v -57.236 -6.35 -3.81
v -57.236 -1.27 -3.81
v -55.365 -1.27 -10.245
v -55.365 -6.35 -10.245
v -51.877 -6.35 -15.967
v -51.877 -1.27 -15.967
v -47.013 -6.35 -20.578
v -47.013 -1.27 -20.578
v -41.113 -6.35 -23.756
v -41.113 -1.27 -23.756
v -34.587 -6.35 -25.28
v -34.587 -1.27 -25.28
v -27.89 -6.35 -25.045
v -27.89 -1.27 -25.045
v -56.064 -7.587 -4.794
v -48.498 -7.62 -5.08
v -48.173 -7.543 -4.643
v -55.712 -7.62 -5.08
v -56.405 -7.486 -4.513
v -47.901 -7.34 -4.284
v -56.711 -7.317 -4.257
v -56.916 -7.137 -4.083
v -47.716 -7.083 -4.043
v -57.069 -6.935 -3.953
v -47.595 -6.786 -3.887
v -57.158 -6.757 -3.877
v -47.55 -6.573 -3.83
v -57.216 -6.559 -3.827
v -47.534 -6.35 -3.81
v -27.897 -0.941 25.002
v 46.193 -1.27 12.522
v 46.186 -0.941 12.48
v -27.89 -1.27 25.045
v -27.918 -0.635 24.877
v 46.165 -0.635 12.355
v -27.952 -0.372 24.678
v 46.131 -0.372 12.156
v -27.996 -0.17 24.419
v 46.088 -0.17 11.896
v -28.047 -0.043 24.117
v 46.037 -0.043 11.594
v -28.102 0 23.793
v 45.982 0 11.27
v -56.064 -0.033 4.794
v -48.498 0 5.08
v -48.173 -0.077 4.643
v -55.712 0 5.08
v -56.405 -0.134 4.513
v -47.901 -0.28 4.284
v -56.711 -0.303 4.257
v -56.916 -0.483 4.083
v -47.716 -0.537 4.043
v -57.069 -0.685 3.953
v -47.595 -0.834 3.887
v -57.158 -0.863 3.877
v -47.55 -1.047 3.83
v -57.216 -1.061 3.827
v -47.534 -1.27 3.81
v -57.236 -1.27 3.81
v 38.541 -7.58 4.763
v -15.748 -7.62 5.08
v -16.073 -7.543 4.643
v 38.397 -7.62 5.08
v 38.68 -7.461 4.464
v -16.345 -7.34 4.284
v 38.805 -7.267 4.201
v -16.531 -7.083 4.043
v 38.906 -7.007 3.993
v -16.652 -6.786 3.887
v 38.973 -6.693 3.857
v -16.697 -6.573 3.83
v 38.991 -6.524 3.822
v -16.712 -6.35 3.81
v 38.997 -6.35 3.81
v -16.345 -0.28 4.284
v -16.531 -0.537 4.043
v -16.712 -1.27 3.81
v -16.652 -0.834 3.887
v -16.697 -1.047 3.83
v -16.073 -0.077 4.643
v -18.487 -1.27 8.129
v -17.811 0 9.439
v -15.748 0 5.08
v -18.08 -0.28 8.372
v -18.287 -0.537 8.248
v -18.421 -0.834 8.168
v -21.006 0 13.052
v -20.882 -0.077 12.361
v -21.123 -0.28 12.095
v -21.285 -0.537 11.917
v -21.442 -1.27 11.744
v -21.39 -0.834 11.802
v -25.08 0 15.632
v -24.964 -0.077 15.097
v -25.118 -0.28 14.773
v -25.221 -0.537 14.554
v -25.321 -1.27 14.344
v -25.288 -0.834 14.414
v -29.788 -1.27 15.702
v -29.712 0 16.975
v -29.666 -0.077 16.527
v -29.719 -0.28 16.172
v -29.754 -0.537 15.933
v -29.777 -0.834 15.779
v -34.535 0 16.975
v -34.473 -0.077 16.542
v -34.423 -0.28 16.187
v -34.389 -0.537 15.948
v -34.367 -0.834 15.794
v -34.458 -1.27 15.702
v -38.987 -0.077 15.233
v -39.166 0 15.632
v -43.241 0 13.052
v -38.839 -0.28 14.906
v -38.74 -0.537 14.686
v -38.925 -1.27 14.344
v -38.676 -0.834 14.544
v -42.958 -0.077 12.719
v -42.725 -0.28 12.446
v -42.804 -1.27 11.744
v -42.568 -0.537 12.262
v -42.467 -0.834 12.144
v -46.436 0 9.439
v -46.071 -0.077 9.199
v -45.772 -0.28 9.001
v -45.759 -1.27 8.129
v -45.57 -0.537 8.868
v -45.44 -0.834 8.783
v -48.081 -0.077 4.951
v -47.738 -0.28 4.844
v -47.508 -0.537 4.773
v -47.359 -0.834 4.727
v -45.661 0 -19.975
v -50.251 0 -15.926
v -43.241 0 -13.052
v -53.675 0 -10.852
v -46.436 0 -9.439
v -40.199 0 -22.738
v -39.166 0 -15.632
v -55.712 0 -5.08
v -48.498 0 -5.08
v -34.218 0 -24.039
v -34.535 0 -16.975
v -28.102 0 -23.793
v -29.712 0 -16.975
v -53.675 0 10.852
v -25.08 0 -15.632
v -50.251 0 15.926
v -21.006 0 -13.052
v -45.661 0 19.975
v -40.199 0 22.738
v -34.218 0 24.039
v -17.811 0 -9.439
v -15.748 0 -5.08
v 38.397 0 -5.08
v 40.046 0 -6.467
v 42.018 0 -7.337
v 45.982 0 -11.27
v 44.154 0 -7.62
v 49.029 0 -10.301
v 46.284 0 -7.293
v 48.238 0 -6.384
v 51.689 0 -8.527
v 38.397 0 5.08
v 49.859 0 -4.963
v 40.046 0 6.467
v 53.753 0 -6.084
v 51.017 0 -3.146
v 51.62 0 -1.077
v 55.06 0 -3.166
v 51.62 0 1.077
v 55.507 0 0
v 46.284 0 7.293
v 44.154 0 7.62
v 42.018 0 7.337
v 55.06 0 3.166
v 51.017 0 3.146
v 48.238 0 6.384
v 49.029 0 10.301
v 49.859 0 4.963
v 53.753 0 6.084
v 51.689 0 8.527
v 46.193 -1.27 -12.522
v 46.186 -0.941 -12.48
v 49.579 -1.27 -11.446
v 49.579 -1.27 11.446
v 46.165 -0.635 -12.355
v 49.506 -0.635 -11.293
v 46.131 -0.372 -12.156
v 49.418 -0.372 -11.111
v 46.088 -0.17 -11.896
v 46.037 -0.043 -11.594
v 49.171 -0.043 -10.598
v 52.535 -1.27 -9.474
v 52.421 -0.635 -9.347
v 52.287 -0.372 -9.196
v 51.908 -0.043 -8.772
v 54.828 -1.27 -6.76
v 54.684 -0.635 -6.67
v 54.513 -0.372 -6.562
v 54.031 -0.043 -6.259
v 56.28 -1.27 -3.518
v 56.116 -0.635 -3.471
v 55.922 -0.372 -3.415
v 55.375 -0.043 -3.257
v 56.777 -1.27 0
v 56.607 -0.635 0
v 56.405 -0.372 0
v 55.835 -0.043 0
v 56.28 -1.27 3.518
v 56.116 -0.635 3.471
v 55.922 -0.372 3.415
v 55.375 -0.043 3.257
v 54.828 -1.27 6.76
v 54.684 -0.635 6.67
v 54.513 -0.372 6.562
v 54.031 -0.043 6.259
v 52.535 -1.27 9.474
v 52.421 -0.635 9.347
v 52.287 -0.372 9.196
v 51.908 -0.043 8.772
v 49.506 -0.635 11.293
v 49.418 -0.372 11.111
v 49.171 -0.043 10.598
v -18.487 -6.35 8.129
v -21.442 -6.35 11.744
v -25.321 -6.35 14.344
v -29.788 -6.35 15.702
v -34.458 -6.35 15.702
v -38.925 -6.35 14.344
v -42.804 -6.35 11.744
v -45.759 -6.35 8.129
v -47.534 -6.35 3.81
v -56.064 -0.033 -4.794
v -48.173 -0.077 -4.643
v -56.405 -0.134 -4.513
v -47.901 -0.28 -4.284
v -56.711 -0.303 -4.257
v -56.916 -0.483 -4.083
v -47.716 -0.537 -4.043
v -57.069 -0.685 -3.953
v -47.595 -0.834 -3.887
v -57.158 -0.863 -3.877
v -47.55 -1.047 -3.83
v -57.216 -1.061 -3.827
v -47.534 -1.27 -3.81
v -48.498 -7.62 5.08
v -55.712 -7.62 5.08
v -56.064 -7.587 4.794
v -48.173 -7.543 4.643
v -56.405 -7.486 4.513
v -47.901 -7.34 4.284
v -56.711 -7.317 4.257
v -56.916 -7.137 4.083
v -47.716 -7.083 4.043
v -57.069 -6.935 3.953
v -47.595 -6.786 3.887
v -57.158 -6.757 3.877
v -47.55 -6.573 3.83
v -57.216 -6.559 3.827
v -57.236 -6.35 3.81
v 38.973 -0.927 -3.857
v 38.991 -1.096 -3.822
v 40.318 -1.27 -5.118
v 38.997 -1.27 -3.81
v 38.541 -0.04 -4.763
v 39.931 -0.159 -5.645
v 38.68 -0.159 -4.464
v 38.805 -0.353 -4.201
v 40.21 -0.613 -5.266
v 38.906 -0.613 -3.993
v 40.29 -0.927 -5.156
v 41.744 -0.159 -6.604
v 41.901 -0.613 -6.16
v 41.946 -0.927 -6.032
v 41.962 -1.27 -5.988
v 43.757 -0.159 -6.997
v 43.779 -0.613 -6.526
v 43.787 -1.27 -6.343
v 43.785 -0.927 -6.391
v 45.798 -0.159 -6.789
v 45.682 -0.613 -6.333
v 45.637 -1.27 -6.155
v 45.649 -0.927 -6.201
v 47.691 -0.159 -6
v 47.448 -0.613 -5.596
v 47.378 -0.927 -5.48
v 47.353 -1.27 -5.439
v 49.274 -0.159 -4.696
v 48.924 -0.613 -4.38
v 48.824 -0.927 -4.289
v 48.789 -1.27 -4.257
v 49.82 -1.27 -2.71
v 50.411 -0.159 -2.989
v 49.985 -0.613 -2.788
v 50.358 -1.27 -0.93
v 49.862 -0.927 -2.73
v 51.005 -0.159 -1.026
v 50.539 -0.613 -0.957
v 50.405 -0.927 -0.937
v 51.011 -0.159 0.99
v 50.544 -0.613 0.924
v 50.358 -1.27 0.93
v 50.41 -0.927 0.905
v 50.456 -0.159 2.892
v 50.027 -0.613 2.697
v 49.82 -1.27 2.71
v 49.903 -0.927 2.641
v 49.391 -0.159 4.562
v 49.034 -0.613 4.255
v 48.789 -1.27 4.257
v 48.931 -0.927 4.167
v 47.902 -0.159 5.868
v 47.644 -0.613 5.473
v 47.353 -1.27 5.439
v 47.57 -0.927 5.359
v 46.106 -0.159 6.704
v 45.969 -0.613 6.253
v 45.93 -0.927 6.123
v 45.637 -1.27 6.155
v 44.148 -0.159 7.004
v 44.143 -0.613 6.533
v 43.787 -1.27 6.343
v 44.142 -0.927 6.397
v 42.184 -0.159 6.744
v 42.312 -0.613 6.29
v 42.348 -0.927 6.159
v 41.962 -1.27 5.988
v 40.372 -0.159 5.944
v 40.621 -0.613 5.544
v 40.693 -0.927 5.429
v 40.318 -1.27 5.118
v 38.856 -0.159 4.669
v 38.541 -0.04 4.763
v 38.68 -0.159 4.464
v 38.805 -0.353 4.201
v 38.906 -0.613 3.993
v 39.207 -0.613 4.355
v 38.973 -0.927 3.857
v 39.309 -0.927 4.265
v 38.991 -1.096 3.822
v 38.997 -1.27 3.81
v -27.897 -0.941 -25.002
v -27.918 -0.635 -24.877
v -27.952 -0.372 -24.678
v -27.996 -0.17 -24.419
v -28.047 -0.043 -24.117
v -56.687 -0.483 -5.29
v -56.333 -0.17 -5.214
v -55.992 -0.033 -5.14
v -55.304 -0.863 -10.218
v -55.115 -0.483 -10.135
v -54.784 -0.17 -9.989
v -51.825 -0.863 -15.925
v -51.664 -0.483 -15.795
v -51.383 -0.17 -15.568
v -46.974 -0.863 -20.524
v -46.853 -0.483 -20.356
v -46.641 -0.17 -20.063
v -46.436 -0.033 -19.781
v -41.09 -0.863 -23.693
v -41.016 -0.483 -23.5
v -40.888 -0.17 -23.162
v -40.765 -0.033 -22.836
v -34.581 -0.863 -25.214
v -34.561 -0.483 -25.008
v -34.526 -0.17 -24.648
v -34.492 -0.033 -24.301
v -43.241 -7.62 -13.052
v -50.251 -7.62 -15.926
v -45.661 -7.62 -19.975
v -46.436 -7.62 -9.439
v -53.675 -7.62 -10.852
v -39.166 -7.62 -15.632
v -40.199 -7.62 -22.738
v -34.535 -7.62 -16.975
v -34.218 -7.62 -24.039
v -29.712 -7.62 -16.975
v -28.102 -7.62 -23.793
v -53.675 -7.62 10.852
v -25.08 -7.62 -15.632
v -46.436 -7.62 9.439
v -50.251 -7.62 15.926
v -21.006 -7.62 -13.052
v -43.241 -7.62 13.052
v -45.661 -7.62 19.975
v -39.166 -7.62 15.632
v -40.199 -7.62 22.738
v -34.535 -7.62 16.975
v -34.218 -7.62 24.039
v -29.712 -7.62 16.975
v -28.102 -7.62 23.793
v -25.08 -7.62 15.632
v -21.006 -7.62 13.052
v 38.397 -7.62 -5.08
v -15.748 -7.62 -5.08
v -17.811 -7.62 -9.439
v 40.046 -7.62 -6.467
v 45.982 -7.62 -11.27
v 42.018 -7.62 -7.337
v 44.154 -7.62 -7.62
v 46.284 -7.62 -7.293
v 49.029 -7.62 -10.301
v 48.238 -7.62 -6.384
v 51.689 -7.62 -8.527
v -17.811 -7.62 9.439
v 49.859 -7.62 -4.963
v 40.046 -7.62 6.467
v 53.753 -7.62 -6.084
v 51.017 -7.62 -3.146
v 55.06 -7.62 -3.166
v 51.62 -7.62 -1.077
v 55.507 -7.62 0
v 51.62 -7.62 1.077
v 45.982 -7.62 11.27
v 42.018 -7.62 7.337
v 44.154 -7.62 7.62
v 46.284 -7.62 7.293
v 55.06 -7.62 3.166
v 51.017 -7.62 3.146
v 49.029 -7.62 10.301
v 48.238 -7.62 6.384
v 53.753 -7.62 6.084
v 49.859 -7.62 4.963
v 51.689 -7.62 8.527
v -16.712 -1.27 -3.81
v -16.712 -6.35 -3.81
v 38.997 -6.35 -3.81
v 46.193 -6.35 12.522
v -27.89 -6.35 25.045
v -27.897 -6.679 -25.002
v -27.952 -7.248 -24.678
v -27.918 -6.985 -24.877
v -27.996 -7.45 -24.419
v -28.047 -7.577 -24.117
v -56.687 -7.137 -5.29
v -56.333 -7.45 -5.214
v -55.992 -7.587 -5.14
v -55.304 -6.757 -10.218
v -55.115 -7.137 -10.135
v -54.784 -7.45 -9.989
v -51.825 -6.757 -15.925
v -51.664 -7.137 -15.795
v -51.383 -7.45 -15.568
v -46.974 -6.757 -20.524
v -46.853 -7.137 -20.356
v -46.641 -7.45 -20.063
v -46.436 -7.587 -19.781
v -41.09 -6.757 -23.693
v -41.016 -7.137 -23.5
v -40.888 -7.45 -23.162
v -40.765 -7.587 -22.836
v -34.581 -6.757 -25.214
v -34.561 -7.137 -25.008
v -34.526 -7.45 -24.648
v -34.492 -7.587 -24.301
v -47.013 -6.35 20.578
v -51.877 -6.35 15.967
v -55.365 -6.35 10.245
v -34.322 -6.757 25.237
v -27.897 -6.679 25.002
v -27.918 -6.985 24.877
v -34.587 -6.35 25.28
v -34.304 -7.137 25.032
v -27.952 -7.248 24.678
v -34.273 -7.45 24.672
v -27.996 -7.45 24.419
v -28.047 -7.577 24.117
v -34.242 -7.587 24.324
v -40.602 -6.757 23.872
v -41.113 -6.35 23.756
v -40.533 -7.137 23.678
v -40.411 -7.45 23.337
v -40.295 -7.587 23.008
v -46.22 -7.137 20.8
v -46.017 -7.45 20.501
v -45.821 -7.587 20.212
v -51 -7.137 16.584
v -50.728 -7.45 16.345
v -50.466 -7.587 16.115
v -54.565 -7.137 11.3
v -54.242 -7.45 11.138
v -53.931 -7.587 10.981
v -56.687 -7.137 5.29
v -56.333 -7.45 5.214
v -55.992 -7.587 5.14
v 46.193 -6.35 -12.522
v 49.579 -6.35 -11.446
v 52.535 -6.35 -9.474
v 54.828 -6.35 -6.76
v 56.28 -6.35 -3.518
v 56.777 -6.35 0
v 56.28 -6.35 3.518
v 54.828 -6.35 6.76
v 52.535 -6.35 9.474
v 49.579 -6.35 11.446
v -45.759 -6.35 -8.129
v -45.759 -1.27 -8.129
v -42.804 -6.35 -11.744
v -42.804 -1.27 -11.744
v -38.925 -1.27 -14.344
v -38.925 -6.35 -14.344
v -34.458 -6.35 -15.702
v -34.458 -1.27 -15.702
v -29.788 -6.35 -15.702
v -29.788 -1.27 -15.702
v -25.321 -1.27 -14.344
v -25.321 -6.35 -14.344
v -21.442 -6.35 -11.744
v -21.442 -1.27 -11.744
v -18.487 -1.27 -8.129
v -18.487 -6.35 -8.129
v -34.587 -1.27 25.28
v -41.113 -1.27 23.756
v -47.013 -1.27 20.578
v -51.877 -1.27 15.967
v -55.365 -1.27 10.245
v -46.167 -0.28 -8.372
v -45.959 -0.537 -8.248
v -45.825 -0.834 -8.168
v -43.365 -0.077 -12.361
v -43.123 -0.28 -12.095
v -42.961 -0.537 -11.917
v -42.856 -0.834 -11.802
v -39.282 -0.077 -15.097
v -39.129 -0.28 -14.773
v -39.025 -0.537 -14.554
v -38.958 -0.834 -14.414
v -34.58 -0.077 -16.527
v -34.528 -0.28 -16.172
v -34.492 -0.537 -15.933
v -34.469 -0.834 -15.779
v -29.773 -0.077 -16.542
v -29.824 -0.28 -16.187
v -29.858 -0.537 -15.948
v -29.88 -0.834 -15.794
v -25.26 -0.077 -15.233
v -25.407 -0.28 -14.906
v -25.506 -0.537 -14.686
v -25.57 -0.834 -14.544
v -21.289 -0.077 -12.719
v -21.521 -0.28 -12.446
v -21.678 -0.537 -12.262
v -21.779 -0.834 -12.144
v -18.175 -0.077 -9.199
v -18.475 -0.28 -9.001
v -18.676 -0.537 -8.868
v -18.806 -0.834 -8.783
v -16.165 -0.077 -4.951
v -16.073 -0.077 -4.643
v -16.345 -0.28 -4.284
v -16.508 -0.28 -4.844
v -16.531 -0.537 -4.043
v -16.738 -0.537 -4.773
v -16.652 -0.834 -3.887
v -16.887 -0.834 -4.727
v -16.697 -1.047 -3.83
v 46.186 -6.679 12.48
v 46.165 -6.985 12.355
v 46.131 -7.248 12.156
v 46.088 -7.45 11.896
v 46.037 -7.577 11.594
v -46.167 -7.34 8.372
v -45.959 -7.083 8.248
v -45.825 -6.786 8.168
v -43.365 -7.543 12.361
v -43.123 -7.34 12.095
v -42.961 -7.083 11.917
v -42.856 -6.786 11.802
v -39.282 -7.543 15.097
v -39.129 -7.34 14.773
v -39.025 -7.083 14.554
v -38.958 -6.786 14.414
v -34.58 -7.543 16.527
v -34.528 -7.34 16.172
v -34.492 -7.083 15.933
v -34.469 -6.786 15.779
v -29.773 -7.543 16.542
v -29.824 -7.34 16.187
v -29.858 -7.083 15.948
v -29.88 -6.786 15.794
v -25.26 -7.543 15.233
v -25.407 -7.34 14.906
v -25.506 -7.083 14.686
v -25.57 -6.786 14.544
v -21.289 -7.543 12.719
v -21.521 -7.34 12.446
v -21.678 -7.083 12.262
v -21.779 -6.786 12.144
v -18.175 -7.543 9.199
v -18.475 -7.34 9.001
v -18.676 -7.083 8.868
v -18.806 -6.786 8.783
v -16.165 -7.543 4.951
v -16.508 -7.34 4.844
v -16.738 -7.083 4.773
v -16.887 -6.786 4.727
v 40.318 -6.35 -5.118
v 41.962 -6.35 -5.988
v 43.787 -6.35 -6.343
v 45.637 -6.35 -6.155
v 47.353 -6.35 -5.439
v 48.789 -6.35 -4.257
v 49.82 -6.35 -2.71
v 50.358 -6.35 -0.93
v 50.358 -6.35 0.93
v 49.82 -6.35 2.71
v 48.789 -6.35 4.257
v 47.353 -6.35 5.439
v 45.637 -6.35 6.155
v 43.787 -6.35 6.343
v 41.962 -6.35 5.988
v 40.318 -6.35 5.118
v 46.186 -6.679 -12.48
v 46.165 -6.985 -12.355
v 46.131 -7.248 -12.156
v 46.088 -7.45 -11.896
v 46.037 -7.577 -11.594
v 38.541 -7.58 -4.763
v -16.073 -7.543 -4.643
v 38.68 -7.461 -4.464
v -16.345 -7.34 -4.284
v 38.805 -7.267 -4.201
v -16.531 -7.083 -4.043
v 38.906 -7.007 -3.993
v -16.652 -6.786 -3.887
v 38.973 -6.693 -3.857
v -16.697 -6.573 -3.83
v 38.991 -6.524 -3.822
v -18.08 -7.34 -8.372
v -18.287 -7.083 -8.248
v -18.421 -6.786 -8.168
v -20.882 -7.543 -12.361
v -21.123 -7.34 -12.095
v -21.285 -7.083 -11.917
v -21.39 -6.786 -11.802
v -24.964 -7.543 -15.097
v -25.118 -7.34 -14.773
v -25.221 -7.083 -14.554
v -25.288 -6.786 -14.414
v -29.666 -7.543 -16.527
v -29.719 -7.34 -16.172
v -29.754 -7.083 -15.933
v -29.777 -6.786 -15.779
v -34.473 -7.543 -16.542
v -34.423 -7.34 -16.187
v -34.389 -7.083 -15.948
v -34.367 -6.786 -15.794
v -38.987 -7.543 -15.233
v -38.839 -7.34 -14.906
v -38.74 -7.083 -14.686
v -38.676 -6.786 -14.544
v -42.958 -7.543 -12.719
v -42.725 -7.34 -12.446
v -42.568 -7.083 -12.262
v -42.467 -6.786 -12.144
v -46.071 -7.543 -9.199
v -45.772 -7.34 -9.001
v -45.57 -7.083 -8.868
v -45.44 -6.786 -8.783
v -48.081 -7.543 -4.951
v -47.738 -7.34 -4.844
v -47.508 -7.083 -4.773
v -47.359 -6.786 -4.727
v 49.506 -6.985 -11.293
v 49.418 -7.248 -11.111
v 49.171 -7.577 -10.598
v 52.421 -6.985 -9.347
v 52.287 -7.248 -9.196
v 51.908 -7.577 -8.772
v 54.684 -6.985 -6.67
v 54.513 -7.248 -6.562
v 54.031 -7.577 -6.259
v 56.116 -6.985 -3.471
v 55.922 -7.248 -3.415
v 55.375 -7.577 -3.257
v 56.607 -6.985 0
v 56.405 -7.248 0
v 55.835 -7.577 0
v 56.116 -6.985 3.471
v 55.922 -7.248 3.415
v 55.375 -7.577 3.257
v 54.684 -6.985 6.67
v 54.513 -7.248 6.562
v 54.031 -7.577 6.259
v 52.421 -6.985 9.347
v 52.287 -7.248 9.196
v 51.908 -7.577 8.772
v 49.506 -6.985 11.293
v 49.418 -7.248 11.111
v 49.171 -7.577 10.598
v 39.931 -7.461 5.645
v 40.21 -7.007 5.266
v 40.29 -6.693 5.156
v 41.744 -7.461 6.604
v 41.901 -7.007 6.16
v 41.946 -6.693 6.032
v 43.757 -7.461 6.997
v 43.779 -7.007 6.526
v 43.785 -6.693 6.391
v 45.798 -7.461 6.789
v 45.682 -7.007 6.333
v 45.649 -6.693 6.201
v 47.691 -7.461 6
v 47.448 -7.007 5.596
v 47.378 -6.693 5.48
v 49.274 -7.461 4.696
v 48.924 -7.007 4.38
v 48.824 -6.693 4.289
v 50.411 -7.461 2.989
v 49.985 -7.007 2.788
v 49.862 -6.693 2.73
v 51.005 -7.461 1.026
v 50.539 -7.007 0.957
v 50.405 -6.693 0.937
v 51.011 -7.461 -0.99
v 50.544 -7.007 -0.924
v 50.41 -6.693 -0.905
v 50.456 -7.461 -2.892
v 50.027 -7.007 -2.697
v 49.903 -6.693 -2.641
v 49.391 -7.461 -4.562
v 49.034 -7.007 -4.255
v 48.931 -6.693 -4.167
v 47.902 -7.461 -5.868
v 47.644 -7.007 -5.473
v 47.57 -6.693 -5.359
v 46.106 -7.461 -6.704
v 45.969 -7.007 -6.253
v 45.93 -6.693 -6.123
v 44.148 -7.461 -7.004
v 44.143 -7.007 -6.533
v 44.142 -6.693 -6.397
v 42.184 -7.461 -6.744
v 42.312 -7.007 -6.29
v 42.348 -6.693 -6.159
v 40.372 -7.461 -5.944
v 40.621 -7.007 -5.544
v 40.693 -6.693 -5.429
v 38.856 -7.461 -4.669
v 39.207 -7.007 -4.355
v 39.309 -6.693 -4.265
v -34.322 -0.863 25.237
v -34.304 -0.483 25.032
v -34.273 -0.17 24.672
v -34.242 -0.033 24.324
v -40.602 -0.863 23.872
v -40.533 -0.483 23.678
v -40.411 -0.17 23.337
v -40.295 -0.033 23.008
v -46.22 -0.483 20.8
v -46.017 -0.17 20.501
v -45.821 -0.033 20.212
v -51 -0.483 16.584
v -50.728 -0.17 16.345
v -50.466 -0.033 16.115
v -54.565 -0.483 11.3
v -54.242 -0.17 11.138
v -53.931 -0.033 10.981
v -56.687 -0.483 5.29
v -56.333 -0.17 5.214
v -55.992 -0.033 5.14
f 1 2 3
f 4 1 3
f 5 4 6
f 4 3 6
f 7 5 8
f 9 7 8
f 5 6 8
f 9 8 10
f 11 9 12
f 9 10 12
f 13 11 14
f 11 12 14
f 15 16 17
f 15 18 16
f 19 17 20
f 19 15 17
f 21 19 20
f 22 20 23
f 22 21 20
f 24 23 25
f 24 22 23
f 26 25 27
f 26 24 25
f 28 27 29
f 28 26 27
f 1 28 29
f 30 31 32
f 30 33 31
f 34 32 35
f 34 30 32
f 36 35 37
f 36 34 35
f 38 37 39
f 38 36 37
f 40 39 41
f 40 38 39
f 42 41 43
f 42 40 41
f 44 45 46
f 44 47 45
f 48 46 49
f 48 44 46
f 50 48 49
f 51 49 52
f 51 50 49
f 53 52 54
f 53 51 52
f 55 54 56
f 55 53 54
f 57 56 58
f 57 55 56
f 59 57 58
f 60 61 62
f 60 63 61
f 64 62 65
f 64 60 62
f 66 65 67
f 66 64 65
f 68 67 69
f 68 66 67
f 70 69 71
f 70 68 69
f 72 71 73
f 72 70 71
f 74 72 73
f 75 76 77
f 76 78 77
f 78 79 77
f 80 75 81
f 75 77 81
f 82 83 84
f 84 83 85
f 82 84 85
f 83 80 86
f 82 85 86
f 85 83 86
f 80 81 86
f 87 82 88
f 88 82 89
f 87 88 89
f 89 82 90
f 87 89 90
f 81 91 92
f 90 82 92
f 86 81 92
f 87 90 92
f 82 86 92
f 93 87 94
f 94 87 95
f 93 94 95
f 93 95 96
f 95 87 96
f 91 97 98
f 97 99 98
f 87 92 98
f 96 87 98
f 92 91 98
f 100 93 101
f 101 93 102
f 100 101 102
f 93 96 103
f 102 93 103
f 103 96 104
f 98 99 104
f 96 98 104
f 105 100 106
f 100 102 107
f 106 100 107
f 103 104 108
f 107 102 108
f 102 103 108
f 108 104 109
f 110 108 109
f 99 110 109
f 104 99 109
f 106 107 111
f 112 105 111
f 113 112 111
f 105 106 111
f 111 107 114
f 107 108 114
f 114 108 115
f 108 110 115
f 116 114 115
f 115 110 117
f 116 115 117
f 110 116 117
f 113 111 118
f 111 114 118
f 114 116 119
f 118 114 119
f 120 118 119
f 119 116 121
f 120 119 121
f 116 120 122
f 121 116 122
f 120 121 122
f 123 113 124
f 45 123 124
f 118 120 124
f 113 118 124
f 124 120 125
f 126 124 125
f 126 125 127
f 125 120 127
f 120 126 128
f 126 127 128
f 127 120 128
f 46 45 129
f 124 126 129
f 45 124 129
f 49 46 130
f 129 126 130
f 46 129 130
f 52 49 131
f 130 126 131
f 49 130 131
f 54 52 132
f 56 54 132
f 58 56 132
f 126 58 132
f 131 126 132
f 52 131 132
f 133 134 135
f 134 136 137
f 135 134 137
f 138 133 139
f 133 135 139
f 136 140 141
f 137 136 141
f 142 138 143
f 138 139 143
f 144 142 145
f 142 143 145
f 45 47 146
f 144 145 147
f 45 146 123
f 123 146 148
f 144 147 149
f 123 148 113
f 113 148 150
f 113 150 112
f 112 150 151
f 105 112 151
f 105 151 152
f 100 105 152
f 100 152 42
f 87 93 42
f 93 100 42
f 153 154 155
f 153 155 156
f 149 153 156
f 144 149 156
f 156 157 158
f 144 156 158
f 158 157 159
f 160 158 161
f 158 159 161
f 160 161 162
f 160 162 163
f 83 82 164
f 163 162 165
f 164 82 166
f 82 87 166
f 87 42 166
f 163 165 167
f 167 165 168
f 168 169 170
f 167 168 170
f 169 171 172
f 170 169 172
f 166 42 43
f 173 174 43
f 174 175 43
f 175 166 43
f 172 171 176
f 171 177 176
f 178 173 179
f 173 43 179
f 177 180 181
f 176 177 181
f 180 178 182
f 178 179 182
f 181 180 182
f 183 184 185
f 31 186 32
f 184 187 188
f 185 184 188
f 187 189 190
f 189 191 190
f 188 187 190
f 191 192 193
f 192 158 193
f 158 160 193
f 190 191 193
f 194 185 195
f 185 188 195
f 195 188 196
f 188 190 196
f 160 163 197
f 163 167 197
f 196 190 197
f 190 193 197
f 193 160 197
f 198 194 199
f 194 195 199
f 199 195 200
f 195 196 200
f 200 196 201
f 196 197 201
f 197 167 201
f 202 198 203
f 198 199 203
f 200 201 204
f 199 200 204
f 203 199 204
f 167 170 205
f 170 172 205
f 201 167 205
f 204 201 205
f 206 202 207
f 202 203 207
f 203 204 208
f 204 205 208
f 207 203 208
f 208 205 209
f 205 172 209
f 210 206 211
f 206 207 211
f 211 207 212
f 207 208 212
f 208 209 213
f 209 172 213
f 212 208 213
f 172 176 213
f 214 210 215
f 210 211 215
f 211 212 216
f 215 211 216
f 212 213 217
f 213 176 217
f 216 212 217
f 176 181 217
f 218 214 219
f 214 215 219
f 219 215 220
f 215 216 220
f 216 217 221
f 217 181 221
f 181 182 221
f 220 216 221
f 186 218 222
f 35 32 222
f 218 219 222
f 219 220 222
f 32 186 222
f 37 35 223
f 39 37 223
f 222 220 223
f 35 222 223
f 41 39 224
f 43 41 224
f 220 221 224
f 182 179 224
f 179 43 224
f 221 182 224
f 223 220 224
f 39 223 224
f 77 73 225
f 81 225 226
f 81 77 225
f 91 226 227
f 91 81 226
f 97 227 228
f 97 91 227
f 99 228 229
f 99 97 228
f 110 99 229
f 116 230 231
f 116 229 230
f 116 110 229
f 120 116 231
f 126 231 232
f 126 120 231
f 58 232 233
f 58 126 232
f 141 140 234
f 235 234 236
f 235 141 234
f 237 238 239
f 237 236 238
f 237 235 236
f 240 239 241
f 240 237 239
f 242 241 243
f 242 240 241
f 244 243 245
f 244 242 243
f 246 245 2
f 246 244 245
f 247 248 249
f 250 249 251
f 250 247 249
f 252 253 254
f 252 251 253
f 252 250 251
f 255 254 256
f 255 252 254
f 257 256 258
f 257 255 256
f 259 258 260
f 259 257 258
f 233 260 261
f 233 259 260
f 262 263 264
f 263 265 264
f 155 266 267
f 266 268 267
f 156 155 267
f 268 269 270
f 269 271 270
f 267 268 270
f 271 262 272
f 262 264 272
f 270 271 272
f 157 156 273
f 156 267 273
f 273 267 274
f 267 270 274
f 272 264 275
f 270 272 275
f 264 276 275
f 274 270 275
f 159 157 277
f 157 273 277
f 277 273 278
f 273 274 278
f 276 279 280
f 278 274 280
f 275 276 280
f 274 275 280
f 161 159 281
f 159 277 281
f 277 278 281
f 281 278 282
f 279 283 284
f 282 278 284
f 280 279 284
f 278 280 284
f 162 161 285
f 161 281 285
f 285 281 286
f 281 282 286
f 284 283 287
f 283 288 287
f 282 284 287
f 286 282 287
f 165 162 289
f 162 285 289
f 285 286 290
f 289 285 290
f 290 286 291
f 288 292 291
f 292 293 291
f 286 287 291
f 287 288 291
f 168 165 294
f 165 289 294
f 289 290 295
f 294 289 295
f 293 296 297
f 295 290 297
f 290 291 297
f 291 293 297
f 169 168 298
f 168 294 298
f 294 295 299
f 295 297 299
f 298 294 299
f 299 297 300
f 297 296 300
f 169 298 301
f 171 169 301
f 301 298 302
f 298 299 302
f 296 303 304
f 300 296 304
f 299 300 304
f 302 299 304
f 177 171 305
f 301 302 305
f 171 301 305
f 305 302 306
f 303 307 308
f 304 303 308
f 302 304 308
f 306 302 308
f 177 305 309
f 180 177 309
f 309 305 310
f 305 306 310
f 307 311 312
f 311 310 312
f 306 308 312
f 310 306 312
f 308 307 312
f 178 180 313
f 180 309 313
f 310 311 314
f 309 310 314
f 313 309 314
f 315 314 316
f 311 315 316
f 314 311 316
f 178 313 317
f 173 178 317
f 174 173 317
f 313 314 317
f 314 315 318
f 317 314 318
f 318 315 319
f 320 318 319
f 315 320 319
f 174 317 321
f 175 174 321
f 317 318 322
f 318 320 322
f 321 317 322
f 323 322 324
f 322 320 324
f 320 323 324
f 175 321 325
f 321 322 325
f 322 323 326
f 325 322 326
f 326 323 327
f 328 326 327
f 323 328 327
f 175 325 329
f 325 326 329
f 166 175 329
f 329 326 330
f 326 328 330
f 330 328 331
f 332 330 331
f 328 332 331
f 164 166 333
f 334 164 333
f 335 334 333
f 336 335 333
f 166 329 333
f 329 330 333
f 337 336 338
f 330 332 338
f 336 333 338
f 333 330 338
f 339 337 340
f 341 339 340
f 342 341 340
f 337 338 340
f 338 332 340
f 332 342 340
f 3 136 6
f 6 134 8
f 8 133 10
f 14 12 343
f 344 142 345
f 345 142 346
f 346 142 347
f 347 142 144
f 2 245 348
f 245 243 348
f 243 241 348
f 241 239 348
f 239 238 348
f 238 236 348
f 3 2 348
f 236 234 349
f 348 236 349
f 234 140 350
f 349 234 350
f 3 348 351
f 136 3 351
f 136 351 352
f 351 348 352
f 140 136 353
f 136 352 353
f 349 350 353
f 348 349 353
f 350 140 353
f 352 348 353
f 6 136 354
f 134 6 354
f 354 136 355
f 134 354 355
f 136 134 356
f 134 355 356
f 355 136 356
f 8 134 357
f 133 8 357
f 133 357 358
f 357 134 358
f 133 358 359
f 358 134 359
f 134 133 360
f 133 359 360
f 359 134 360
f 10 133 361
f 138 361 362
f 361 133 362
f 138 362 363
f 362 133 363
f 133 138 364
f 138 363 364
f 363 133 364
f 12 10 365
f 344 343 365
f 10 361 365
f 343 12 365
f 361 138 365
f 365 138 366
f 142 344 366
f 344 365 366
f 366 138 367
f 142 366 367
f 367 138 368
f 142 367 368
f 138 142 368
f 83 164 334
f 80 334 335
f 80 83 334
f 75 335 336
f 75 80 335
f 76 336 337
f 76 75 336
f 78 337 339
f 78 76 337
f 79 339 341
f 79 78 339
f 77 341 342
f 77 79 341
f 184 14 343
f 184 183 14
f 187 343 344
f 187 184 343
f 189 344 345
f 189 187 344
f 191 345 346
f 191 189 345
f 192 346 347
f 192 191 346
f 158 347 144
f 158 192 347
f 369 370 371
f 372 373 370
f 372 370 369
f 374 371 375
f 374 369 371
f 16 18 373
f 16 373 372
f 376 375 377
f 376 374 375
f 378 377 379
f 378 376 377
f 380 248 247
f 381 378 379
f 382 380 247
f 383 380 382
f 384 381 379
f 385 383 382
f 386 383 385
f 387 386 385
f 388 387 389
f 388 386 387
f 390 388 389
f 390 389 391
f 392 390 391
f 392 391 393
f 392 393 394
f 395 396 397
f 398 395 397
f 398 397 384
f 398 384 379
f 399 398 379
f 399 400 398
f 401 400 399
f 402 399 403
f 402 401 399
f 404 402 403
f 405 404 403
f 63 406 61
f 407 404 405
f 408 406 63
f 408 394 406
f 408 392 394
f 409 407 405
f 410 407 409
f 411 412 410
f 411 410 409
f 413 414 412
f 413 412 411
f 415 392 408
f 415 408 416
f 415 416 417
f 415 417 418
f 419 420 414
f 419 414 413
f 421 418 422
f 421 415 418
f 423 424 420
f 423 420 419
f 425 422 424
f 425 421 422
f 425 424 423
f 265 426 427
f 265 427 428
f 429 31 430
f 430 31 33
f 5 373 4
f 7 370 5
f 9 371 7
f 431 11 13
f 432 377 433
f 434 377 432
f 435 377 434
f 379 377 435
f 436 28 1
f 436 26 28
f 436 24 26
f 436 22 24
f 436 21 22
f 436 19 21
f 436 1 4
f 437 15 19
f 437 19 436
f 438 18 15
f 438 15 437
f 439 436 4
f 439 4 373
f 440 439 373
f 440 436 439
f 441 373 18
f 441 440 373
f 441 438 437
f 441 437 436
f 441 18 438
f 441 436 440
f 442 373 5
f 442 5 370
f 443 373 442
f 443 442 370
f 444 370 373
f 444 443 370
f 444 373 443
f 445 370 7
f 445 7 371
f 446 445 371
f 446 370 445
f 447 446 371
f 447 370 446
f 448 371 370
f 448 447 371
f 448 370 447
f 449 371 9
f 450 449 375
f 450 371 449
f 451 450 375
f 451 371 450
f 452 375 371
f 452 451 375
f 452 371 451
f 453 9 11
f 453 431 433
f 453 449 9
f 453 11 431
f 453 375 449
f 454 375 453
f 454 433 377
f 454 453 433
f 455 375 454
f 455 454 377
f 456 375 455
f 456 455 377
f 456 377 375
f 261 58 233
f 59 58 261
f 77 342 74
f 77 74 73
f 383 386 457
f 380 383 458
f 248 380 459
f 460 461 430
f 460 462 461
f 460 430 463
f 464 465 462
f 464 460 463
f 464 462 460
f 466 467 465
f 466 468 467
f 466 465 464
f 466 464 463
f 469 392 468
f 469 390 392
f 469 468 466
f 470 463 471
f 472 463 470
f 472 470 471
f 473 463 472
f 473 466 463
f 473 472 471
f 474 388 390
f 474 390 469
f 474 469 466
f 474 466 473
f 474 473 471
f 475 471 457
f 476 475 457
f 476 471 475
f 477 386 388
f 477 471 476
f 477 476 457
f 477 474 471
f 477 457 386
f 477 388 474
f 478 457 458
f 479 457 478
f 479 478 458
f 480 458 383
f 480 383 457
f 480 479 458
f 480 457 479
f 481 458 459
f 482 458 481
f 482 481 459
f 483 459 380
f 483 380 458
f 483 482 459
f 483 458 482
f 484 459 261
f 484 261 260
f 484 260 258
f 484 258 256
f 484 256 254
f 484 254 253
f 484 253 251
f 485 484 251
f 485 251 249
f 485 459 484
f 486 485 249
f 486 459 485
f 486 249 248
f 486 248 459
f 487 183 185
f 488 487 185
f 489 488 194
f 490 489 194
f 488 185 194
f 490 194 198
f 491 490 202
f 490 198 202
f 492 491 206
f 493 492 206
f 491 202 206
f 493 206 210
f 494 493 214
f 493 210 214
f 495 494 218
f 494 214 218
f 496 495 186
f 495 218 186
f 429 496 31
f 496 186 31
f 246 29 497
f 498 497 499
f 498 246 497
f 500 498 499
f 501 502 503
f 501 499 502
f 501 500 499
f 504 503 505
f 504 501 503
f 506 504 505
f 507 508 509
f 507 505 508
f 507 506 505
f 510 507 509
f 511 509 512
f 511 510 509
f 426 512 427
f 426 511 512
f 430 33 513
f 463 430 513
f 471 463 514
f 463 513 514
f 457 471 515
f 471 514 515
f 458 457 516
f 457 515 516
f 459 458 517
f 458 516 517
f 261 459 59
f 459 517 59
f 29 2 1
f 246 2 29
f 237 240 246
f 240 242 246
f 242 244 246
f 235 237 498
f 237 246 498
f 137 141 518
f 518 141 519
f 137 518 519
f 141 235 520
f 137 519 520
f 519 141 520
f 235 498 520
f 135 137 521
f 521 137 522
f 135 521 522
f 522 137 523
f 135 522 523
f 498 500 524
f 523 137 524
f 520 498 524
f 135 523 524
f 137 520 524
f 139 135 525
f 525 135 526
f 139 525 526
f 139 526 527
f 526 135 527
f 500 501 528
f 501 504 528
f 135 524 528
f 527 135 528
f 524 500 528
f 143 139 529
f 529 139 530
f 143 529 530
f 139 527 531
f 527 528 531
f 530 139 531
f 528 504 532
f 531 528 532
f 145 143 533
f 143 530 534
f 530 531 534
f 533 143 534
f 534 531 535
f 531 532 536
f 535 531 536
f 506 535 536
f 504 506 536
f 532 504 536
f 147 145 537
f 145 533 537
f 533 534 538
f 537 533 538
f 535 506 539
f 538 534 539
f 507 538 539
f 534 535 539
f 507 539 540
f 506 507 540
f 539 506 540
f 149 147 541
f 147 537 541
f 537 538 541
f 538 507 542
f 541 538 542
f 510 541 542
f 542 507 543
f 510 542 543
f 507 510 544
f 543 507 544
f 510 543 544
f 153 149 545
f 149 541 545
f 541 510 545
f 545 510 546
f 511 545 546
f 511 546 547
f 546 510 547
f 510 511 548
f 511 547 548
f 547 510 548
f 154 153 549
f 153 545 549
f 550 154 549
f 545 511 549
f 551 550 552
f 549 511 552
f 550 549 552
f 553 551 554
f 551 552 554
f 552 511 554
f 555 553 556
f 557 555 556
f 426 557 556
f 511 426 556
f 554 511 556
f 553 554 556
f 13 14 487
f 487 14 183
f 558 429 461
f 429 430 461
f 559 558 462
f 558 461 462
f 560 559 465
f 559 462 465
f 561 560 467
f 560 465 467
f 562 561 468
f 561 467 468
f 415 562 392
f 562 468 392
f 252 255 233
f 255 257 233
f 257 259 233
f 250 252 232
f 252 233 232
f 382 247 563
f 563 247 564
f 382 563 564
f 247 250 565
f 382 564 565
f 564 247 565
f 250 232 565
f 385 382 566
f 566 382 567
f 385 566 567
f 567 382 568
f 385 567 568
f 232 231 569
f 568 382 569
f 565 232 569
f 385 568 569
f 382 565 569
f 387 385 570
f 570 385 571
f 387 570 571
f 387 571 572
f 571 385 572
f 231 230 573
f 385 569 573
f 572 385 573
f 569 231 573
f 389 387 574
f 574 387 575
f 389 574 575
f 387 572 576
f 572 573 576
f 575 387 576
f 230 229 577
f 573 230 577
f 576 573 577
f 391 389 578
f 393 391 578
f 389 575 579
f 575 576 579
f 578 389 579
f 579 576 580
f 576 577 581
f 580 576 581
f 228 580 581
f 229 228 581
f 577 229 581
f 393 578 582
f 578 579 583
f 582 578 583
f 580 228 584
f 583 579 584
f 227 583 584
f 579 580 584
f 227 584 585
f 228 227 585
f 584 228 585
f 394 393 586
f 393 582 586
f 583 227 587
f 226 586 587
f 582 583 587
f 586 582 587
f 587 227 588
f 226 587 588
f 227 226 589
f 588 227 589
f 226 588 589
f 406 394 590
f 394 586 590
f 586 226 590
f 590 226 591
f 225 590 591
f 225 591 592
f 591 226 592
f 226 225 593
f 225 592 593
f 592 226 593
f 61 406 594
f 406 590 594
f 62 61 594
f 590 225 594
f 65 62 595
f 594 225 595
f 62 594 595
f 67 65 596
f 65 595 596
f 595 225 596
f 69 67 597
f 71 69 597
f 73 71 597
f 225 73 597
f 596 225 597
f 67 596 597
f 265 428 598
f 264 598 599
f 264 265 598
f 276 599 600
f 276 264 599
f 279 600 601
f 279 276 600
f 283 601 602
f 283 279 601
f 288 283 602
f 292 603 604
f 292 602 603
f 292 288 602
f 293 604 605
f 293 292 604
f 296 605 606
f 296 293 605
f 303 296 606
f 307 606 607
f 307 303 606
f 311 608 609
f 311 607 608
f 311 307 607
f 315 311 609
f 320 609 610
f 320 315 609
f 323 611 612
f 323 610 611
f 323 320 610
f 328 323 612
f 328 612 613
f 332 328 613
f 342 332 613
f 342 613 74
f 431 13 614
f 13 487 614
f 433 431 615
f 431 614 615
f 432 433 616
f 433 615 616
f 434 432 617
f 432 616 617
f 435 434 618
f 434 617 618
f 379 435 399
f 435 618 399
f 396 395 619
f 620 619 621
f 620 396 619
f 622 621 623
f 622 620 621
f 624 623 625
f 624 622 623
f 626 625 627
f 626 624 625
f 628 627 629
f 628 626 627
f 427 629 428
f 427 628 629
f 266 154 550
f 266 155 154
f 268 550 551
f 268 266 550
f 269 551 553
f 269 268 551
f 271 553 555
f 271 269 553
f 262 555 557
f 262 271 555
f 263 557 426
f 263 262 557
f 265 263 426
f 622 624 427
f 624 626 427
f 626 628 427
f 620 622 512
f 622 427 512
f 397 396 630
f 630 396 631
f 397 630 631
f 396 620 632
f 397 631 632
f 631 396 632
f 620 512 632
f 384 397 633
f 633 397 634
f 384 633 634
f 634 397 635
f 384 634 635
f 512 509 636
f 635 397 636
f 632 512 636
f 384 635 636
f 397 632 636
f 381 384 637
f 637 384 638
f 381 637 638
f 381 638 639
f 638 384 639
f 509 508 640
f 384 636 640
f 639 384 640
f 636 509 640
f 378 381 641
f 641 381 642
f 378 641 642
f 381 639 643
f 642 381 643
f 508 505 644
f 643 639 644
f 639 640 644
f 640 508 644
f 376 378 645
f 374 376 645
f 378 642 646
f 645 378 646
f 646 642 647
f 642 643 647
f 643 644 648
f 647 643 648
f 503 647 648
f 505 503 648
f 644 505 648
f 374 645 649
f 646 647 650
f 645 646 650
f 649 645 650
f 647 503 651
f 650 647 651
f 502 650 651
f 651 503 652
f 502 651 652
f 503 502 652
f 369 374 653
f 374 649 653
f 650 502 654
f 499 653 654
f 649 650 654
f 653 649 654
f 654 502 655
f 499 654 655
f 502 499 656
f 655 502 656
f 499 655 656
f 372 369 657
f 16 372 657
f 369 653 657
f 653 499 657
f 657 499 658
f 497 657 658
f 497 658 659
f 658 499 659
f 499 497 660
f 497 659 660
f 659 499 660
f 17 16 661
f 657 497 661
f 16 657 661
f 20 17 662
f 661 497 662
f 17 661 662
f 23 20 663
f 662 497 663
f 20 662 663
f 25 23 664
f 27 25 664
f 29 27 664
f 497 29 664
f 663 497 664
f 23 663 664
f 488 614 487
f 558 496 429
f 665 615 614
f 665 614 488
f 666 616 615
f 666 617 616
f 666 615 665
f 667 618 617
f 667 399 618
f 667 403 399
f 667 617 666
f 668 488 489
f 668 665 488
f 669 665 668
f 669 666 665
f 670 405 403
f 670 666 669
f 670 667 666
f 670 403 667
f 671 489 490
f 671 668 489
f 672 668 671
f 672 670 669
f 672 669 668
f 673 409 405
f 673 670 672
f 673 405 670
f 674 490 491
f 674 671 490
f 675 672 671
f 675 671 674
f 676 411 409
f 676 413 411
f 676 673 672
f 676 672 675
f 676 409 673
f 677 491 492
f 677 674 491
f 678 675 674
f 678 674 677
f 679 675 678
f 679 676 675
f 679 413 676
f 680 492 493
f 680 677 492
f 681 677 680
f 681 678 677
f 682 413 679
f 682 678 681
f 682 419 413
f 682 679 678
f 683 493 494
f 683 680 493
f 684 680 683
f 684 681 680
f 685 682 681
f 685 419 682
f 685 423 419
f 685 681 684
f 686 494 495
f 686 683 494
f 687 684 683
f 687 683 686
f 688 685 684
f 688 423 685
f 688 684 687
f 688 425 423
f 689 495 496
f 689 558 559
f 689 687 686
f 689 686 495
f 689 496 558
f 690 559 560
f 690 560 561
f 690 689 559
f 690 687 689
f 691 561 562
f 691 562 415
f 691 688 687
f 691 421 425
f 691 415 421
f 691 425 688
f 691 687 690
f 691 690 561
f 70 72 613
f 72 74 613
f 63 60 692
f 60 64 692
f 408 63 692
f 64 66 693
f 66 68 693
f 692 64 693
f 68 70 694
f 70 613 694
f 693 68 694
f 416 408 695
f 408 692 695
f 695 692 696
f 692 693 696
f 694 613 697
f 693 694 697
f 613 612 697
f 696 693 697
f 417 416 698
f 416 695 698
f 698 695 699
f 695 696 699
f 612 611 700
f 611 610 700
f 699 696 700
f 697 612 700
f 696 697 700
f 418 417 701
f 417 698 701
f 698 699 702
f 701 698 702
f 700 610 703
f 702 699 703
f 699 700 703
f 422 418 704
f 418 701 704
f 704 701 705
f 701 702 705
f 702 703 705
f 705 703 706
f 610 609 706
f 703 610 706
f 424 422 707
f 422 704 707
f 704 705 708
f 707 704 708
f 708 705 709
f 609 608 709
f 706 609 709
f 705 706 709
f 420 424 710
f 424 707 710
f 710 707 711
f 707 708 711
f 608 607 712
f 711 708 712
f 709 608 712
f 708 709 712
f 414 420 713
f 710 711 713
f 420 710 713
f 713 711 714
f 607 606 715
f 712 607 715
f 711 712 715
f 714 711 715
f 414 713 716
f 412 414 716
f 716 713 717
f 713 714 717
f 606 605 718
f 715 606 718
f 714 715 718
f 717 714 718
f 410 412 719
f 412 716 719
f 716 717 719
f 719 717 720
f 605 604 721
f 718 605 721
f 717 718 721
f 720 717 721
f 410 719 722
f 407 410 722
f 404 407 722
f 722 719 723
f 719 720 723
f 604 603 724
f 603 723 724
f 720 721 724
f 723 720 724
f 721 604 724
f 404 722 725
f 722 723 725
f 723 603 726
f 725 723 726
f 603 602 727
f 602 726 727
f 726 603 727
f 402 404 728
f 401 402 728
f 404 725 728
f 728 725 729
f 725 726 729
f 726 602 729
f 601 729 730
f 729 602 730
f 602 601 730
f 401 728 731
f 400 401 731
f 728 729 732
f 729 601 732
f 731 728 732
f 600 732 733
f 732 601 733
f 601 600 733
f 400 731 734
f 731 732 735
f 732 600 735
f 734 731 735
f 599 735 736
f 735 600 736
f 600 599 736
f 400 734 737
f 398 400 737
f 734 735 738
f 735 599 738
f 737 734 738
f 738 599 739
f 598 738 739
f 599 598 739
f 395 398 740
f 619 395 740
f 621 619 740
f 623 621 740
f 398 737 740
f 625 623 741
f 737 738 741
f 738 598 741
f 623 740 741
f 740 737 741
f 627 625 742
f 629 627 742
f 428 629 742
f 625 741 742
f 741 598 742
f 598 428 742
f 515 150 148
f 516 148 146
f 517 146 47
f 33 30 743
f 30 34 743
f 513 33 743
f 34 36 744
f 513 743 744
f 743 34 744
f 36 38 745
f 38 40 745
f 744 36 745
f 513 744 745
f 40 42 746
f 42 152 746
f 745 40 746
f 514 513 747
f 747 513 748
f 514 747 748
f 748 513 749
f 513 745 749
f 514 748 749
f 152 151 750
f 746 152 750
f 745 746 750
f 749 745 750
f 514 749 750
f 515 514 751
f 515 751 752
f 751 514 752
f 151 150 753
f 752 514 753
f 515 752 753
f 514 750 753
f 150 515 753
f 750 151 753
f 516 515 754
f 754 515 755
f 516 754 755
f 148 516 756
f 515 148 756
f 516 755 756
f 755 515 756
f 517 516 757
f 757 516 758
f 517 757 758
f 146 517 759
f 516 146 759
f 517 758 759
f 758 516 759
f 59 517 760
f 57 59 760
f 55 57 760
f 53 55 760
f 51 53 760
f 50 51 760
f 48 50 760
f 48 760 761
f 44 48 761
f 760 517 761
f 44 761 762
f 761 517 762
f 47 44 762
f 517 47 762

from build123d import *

# Parameters (mm, degrees)
F2_DEPTH      = 7.62
F3_DEPTH      = 7.621
F3_DEPTH_BACK = 25.4
F4_R          = 1.27


with BuildPart() as f2:
    # F0 (on Front) → F2 (new body)
    with BuildSketch(Plane.XZ):
        with BuildLine():
            Line((46.1934629007, 12.5223688742), (-27.8898704326, 25.0447377485))
            ThreePointArc((-27.8898704326, 25.0447377485), (-57.5232037659, 0), (-27.8898704326, -25.0447377485))
            Line((-27.8898704326, -25.0447377485), (46.1934629007, -12.5223688742))
            ThreePointArc((46.1934629007, -12.5223688742), (56.7767962341, 0), (46.1934629007, 12.5223688742))
        make_face()
    extrude(amount=F2_DEPTH)

    # F1 (on Front) → F3 (cut, two sides)
    with BuildSketch(Plane.XZ) as f3_sk:
        with BuildLine():
            Line((38.9967962341, 3.81), (-16.7121841695, 3.81))
            ThreePointArc((-16.7121841695, 3.81), (-32.1232037659, 15.875), (-47.5342233623, 3.81))
            Line((-47.5342233623, 3.81), (-111.9550562739, 3.81))
            Line((-111.9550562739, 3.81), (-111.9550562739, -3.81))
            Line((-111.9550562739, -3.81), (-47.5342233623, -3.81))
            ThreePointArc((-47.5342233623, -3.81), (-32.1232037659, -15.875), (-16.7121841695, -3.81))
            Line((-16.7121841695, -3.81), (38.9967962341, -3.81))
            ThreePointArc((38.9967962341, -3.81), (50.4267962341, 0), (38.9967962341, 3.81))
        make_face()
    extrude(amount=F3_DEPTH, mode=Mode.SUBTRACT)
    extrude(f3_sk.sketch, amount=-F3_DEPTH_BACK, mode=Mode.SUBTRACT)

    # F4
    f4_edges = [f2.edges().sort_by_distance(p)[0] for p in [
        (56.776796, 0, 0),
        (9.151796, 0, -18.783553),
        (-47.013292, 0, -20.577786),
        (-52.385026, 0, -3.81),
        (-32.123204, 0, -15.875),
        (11.142306, 0, -3.81),
        (50.426796, 0, 0),
        (11.142306, 0, 3.81),
        (-32.123204, 0, 15.875),
        (-52.385026, 0, 3.81),
        (-47.013292, 0, 20.577786),
        (9.151796, 0, 18.783553),
        (56.776796, -7.62, 0),
        (9.151796, -7.62, -18.783553),
        (-47.013292, -7.62, -20.577786),
        (-52.385026, -7.62, -3.81),
        (-32.123204, -7.62, -15.875),
        (11.142306, -7.62, -3.81),
        (50.426796, -7.62, 0),
        (11.142306, -7.62, 3.81),
        (-32.123204, -7.62, 15.875),
        (-52.385026, -7.62, 3.81),
        (-47.013292, -7.62, 20.577786),
        (9.151796, -7.62, 18.783553),
    ]]
    fillet(f4_edges, radius=F4_R)


solid = f2.part
